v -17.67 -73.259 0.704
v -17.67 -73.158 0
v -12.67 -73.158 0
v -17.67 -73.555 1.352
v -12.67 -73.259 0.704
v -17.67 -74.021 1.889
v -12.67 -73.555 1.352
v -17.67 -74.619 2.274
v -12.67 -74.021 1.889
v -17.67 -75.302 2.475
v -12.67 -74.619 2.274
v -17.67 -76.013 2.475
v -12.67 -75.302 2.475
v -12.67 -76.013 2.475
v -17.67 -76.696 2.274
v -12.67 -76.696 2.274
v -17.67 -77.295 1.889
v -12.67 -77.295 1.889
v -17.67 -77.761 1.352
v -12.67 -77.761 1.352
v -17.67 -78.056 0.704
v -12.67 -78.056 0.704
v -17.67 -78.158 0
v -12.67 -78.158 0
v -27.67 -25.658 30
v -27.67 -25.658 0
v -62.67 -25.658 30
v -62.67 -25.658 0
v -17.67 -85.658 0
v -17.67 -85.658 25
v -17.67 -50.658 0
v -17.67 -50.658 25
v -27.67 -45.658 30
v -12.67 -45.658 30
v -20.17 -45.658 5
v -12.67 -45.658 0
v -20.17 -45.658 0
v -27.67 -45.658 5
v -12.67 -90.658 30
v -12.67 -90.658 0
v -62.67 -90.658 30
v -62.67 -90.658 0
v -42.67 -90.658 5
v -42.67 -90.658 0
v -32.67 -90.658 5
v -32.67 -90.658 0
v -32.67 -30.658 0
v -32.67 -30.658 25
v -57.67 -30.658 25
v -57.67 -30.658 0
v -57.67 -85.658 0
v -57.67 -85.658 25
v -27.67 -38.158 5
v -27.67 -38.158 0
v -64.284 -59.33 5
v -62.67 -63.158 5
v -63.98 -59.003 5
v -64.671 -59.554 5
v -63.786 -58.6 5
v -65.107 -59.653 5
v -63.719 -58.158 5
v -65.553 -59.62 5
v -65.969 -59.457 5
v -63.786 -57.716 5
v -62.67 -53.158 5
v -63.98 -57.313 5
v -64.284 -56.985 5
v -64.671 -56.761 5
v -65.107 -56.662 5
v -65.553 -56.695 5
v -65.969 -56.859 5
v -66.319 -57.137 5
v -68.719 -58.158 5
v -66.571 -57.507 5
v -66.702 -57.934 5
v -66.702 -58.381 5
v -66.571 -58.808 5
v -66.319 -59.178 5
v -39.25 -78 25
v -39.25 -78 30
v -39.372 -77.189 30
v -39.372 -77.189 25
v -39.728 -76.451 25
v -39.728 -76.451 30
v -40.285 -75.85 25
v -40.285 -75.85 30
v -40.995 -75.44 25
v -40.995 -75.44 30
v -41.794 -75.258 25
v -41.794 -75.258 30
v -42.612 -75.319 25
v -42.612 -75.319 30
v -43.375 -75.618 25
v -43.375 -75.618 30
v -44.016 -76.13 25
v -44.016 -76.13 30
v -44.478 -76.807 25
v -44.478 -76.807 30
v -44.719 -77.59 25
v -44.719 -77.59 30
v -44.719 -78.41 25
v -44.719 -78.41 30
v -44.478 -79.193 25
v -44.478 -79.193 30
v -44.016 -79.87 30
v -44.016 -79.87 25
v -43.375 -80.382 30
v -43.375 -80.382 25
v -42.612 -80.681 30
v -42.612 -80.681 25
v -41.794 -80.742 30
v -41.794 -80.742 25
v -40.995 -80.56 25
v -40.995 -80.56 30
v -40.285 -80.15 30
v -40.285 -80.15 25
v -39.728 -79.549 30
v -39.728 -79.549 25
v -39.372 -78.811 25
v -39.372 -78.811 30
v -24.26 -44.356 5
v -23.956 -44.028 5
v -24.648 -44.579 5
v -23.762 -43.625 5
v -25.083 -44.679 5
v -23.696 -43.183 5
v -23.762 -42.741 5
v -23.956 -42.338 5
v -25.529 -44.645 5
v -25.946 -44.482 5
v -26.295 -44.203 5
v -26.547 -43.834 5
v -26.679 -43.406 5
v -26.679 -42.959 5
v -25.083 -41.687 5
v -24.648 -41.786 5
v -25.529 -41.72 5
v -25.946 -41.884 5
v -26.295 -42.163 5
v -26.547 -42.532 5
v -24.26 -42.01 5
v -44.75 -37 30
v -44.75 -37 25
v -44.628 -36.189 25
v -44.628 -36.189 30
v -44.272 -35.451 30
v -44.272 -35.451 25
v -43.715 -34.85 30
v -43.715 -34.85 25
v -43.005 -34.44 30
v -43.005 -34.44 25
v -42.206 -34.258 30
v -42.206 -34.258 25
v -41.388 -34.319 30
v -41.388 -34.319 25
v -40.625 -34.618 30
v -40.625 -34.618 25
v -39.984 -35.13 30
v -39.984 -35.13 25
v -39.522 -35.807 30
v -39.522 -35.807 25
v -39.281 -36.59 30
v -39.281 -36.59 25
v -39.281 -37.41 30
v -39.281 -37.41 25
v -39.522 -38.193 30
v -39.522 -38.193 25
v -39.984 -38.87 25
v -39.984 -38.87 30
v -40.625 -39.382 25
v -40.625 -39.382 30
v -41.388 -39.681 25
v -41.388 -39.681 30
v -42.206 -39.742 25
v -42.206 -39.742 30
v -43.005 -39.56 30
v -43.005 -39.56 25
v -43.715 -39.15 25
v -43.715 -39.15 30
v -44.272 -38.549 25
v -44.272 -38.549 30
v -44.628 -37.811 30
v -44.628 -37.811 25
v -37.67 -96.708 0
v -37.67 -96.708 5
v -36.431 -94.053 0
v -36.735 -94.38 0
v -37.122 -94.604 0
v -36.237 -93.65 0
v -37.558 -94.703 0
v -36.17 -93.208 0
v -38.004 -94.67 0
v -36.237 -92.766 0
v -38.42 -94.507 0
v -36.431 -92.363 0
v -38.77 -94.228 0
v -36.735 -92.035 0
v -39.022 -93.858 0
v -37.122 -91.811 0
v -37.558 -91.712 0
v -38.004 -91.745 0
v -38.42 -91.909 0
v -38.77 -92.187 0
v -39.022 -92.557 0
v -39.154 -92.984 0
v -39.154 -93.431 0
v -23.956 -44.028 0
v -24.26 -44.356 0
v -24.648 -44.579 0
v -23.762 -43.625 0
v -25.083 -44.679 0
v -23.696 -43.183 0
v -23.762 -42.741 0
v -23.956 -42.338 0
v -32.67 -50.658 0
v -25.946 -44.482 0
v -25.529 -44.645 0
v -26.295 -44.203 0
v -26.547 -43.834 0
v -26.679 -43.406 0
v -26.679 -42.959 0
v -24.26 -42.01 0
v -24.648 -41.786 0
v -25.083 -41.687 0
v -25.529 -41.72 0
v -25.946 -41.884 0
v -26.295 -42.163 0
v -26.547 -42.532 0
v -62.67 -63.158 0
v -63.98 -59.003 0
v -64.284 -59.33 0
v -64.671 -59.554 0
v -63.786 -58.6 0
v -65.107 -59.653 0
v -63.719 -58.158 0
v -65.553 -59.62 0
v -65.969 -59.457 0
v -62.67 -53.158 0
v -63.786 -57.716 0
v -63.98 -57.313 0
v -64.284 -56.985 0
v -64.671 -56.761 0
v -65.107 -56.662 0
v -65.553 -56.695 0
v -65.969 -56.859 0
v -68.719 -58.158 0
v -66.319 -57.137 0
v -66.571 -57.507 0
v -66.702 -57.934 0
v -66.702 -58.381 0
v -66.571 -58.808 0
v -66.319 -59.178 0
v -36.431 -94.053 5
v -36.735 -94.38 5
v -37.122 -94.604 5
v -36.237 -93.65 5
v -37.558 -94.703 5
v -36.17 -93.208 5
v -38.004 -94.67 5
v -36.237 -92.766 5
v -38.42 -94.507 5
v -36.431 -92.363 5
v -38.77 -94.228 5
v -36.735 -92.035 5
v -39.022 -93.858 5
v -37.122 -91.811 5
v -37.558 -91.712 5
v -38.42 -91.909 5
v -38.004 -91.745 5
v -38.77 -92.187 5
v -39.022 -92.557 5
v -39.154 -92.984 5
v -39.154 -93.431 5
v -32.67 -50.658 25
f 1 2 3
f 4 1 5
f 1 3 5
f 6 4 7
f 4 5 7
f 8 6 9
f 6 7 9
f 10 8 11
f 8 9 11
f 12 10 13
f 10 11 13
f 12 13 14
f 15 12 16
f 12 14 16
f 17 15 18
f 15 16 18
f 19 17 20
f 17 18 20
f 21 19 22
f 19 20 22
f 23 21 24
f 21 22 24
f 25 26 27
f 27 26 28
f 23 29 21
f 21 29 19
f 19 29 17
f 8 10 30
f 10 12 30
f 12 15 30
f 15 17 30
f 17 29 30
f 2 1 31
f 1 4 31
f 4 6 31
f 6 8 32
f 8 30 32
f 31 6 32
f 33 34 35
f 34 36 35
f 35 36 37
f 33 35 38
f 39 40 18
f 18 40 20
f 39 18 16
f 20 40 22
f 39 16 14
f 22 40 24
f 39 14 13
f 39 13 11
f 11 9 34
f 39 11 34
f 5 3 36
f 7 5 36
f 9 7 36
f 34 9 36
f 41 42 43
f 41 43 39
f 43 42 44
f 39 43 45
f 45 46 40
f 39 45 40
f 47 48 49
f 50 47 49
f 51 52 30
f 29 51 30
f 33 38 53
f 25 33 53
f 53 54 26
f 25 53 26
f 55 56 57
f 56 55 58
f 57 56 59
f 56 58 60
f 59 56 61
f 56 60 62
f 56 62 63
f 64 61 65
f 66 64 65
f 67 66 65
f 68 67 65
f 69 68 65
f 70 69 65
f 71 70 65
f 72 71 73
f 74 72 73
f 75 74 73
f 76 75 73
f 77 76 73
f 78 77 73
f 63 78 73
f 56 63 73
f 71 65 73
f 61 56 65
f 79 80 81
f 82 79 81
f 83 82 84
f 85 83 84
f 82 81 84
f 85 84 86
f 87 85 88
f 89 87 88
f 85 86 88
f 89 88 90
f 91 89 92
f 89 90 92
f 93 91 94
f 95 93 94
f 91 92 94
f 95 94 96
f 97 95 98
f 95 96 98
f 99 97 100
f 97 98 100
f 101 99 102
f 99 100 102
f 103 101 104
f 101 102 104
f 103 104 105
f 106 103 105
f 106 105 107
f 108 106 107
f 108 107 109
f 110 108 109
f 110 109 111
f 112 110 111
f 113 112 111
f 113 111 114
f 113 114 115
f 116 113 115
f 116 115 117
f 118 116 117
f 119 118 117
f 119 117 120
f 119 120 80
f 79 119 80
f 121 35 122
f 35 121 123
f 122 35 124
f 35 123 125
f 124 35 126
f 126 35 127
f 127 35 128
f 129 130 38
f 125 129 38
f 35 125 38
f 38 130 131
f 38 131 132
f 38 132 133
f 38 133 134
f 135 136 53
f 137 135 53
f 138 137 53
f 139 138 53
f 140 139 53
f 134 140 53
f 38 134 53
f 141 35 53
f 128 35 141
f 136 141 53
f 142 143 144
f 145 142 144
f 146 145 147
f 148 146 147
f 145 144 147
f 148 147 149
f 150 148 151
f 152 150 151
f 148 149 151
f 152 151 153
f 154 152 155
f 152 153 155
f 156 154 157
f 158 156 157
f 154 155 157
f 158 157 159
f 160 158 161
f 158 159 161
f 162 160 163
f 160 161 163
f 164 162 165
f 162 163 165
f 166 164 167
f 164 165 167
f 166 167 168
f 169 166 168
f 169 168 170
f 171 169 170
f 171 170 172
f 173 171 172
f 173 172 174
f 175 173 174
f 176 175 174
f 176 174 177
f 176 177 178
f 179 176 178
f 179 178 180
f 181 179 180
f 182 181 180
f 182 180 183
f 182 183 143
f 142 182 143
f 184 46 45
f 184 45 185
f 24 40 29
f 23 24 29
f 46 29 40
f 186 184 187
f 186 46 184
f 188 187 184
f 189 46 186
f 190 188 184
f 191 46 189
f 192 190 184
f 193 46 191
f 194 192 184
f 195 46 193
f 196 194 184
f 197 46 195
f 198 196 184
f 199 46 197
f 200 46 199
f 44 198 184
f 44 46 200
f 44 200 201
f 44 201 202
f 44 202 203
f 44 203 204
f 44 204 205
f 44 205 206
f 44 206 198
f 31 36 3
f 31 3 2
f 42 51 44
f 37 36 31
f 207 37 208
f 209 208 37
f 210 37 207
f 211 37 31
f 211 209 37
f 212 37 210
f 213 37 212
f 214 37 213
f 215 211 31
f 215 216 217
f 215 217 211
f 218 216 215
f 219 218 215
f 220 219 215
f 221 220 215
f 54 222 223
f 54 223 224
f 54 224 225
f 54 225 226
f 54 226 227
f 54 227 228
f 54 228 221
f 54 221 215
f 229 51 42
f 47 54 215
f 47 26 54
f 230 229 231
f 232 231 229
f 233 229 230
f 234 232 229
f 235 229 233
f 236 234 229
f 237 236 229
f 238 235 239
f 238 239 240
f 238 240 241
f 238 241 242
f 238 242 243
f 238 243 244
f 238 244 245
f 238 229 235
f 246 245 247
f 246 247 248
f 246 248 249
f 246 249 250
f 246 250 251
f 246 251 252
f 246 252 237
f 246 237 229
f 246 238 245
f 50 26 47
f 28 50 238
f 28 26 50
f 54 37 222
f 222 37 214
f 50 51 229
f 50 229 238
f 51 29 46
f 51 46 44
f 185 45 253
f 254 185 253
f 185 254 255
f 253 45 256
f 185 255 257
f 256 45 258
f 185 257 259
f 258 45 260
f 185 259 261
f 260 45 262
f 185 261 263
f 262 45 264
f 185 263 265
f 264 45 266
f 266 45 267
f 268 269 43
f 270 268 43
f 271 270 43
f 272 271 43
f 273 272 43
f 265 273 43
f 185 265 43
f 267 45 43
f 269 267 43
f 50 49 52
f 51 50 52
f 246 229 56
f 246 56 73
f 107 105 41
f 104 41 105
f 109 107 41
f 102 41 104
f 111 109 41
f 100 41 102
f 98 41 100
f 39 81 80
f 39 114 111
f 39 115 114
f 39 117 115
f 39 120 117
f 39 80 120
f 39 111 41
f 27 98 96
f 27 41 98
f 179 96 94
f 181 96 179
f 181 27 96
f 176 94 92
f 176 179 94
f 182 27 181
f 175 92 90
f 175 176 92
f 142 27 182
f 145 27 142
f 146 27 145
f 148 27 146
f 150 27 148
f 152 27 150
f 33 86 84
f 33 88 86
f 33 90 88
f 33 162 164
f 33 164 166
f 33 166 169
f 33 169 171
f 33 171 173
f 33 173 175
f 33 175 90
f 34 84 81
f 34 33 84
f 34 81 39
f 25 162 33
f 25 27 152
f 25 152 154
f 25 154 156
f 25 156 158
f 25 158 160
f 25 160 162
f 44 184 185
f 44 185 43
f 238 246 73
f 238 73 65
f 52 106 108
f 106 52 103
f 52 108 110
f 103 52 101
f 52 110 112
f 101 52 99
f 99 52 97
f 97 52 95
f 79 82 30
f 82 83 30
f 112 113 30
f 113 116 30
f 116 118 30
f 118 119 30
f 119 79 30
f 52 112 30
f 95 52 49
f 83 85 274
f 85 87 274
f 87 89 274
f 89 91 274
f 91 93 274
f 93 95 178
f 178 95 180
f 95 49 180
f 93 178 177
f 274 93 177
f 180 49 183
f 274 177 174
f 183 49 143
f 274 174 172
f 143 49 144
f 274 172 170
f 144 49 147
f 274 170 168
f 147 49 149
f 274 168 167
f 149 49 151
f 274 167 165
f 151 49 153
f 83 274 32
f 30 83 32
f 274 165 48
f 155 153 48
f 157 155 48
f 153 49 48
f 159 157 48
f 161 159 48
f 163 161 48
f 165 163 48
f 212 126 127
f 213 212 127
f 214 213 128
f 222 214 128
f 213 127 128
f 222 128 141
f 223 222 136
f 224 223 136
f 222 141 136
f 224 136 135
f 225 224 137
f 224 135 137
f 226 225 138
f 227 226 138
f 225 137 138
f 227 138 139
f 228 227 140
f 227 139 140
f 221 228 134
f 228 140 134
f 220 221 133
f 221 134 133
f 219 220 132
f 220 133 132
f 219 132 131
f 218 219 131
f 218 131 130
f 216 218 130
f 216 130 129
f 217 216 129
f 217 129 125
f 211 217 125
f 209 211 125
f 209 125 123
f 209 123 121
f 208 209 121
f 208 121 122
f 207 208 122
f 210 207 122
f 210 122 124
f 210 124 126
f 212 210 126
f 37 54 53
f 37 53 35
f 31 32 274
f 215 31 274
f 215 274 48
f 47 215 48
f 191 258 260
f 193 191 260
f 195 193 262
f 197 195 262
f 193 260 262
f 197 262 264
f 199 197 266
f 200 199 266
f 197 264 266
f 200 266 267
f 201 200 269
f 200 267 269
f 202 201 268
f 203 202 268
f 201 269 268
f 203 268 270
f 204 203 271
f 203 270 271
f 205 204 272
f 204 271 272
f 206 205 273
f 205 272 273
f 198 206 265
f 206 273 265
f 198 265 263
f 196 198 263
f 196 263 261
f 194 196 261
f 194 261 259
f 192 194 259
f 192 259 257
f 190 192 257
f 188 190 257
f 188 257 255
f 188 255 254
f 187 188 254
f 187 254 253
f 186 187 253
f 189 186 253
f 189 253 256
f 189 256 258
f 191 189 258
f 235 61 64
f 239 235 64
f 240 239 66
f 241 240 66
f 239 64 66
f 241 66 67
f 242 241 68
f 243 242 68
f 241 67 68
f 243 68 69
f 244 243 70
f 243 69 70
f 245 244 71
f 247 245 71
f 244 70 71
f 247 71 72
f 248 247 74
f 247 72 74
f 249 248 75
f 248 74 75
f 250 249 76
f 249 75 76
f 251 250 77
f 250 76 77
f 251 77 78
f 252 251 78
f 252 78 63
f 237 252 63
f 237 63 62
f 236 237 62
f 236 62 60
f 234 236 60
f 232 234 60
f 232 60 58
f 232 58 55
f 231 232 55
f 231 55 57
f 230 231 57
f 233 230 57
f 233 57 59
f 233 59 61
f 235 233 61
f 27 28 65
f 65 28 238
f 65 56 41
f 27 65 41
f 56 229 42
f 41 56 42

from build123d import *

# Parameters (mm, degrees)
BASE_EXTRUDE_DEPTH  = 5
SKETCH12_R          = 1.5
CUT_EXTRUDE11_DEPTH = 10
BOSS_EXTRUDE1_DEPTH = 25
CUT_EXTRUDE14_DEPTH = 20
CUT_EXTRUDE15_DEPTH = 20
SKETCH15_R          = 2.75
CUT_EXTRUDE16_DEPTH = 20
SKETCH16_R          = 2.5
EXTRUDE1_DEPTH      = 10
SKETCH17_R          = 2.75
EXTRUDE2_DEPTH      = 6


with BuildPart() as part:
    # Sketch1 → Base-Extrude (new body)
    with BuildSketch(Plane.XY):
        Polygon((-27.670446838, -25.657666931), (-27.670446838, -38.157666931), (-20.170446838, -45.657666931), (-12.670446838, -45.657666931), (-12.670446838, -90.657666931), (-32.670446838, -90.657666931), (-37.670446838, -96.707666931), (-42.670446838, -90.657666931), (-62.670446838, -90.657666931), (-62.670446838, -63.157666931), (-68.719237079, -58.157666931), (-62.670446838, -53.157666931), (-62.670446838, -25.657666931), align=None)
    extrude(amount=BASE_EXTRUDE_DEPTH)

    # Sketch12 → Cut-Extrude11 (cut)
    with BuildSketch(Plane.XY.offset(5)):
        with Locations((-65.219237079, -58.157666931)):
            Circle(SKETCH12_R)
        with Locations((-37.670446838, -93.207666931)):
            Circle(SKETCH12_R)
        with Locations((-25.195573104, -43.182793197)):
            Circle(SKETCH12_R)
    extrude(amount=-CUT_EXTRUDE11_DEPTH, mode=Mode.SUBTRACT)

    # Sketch13 → Boss-Extrude1 (add)
    with BuildSketch(Plane.XY.offset(5)):
        Polygon((-62.670446838, -25.657666931), (-62.670446838, -90.657666931), (-12.670446838, -90.657666931), (-12.670446838, -45.657666931), (-27.670446838, -45.657666931), (-27.670446838, -25.657666931), align=None)
    extrude(amount=BOSS_EXTRUDE1_DEPTH)

    # Sketch2 → Cut-Extrude14 (cut)
    with BuildSketch(Plane.XY.offset(5)):
        Polygon((-57.670446838, -55.511686018), (-57.670446838, -60.803647844), (-57.670446838, -85.657666931), (-40.31612782, -85.657666931), (-35.024765855, -85.657666931), (-17.670446838, -85.657666931), (-17.670446838, -50.657666931), (-22.24151465, -50.657666931), (-32.670446838, -50.657666931), (-32.670446838, -40.228734743), (-32.670446838, -30.657666931), (-57.670446838, -30.657666931), align=None)
    extrude(amount=-CUT_EXTRUDE14_DEPTH, mode=Mode.SUBTRACT)

    # Sketch14 → Cut-Extrude15 (cut)
    with BuildSketch(Plane(origin=(0, 0, 5), x_dir=(-1, 0, 0), z_dir=(0, 0, -1))):
        Polygon((32.670446838, -30.657666931), (57.670446838, -30.657666931), (57.670446838, -85.657666931), (17.670446838, -85.657666931), (17.670446838, -50.657666931), (32.670446838, -50.657666931), align=None)
    extrude(amount=-CUT_EXTRUDE15_DEPTH, mode=Mode.SUBTRACT)

    # Sketch15 → Cut-Extrude16 (cut)
    with BuildSketch(Plane.XY.offset(30)):
        with Locations((45, -75.657666931)):
            Circle(SKETCH15_R)
        with Locations((-42, -78)):
            Circle(SKETCH15_R)
    extrude(amount=-CUT_EXTRUDE16_DEPTH, mode=Mode.SUBTRACT)

    # Sketch16 → Extrude1 (cut)
    with BuildSketch(Plane(origin=(-12.670446838, 0, 0), x_dir=(0, 0, -1), z_dir=(1, 0, 0))):
        with Locations((0, -75.65766693)):
            Circle(SKETCH16_R)
    extrude(amount=-EXTRUDE1_DEPTH, mode=Mode.SUBTRACT)

    # Sketch17 → Extrude2 (cut)
    with BuildSketch(Plane(origin=(0, 0, 25), x_dir=(-1, 0, 0), z_dir=(0, 0, -1))):
        with Locations((42, -37)):
            Circle(SKETCH17_R)
    extrude(amount=-EXTRUDE2_DEPTH, mode=Mode.SUBTRACT)


solid = part.part
